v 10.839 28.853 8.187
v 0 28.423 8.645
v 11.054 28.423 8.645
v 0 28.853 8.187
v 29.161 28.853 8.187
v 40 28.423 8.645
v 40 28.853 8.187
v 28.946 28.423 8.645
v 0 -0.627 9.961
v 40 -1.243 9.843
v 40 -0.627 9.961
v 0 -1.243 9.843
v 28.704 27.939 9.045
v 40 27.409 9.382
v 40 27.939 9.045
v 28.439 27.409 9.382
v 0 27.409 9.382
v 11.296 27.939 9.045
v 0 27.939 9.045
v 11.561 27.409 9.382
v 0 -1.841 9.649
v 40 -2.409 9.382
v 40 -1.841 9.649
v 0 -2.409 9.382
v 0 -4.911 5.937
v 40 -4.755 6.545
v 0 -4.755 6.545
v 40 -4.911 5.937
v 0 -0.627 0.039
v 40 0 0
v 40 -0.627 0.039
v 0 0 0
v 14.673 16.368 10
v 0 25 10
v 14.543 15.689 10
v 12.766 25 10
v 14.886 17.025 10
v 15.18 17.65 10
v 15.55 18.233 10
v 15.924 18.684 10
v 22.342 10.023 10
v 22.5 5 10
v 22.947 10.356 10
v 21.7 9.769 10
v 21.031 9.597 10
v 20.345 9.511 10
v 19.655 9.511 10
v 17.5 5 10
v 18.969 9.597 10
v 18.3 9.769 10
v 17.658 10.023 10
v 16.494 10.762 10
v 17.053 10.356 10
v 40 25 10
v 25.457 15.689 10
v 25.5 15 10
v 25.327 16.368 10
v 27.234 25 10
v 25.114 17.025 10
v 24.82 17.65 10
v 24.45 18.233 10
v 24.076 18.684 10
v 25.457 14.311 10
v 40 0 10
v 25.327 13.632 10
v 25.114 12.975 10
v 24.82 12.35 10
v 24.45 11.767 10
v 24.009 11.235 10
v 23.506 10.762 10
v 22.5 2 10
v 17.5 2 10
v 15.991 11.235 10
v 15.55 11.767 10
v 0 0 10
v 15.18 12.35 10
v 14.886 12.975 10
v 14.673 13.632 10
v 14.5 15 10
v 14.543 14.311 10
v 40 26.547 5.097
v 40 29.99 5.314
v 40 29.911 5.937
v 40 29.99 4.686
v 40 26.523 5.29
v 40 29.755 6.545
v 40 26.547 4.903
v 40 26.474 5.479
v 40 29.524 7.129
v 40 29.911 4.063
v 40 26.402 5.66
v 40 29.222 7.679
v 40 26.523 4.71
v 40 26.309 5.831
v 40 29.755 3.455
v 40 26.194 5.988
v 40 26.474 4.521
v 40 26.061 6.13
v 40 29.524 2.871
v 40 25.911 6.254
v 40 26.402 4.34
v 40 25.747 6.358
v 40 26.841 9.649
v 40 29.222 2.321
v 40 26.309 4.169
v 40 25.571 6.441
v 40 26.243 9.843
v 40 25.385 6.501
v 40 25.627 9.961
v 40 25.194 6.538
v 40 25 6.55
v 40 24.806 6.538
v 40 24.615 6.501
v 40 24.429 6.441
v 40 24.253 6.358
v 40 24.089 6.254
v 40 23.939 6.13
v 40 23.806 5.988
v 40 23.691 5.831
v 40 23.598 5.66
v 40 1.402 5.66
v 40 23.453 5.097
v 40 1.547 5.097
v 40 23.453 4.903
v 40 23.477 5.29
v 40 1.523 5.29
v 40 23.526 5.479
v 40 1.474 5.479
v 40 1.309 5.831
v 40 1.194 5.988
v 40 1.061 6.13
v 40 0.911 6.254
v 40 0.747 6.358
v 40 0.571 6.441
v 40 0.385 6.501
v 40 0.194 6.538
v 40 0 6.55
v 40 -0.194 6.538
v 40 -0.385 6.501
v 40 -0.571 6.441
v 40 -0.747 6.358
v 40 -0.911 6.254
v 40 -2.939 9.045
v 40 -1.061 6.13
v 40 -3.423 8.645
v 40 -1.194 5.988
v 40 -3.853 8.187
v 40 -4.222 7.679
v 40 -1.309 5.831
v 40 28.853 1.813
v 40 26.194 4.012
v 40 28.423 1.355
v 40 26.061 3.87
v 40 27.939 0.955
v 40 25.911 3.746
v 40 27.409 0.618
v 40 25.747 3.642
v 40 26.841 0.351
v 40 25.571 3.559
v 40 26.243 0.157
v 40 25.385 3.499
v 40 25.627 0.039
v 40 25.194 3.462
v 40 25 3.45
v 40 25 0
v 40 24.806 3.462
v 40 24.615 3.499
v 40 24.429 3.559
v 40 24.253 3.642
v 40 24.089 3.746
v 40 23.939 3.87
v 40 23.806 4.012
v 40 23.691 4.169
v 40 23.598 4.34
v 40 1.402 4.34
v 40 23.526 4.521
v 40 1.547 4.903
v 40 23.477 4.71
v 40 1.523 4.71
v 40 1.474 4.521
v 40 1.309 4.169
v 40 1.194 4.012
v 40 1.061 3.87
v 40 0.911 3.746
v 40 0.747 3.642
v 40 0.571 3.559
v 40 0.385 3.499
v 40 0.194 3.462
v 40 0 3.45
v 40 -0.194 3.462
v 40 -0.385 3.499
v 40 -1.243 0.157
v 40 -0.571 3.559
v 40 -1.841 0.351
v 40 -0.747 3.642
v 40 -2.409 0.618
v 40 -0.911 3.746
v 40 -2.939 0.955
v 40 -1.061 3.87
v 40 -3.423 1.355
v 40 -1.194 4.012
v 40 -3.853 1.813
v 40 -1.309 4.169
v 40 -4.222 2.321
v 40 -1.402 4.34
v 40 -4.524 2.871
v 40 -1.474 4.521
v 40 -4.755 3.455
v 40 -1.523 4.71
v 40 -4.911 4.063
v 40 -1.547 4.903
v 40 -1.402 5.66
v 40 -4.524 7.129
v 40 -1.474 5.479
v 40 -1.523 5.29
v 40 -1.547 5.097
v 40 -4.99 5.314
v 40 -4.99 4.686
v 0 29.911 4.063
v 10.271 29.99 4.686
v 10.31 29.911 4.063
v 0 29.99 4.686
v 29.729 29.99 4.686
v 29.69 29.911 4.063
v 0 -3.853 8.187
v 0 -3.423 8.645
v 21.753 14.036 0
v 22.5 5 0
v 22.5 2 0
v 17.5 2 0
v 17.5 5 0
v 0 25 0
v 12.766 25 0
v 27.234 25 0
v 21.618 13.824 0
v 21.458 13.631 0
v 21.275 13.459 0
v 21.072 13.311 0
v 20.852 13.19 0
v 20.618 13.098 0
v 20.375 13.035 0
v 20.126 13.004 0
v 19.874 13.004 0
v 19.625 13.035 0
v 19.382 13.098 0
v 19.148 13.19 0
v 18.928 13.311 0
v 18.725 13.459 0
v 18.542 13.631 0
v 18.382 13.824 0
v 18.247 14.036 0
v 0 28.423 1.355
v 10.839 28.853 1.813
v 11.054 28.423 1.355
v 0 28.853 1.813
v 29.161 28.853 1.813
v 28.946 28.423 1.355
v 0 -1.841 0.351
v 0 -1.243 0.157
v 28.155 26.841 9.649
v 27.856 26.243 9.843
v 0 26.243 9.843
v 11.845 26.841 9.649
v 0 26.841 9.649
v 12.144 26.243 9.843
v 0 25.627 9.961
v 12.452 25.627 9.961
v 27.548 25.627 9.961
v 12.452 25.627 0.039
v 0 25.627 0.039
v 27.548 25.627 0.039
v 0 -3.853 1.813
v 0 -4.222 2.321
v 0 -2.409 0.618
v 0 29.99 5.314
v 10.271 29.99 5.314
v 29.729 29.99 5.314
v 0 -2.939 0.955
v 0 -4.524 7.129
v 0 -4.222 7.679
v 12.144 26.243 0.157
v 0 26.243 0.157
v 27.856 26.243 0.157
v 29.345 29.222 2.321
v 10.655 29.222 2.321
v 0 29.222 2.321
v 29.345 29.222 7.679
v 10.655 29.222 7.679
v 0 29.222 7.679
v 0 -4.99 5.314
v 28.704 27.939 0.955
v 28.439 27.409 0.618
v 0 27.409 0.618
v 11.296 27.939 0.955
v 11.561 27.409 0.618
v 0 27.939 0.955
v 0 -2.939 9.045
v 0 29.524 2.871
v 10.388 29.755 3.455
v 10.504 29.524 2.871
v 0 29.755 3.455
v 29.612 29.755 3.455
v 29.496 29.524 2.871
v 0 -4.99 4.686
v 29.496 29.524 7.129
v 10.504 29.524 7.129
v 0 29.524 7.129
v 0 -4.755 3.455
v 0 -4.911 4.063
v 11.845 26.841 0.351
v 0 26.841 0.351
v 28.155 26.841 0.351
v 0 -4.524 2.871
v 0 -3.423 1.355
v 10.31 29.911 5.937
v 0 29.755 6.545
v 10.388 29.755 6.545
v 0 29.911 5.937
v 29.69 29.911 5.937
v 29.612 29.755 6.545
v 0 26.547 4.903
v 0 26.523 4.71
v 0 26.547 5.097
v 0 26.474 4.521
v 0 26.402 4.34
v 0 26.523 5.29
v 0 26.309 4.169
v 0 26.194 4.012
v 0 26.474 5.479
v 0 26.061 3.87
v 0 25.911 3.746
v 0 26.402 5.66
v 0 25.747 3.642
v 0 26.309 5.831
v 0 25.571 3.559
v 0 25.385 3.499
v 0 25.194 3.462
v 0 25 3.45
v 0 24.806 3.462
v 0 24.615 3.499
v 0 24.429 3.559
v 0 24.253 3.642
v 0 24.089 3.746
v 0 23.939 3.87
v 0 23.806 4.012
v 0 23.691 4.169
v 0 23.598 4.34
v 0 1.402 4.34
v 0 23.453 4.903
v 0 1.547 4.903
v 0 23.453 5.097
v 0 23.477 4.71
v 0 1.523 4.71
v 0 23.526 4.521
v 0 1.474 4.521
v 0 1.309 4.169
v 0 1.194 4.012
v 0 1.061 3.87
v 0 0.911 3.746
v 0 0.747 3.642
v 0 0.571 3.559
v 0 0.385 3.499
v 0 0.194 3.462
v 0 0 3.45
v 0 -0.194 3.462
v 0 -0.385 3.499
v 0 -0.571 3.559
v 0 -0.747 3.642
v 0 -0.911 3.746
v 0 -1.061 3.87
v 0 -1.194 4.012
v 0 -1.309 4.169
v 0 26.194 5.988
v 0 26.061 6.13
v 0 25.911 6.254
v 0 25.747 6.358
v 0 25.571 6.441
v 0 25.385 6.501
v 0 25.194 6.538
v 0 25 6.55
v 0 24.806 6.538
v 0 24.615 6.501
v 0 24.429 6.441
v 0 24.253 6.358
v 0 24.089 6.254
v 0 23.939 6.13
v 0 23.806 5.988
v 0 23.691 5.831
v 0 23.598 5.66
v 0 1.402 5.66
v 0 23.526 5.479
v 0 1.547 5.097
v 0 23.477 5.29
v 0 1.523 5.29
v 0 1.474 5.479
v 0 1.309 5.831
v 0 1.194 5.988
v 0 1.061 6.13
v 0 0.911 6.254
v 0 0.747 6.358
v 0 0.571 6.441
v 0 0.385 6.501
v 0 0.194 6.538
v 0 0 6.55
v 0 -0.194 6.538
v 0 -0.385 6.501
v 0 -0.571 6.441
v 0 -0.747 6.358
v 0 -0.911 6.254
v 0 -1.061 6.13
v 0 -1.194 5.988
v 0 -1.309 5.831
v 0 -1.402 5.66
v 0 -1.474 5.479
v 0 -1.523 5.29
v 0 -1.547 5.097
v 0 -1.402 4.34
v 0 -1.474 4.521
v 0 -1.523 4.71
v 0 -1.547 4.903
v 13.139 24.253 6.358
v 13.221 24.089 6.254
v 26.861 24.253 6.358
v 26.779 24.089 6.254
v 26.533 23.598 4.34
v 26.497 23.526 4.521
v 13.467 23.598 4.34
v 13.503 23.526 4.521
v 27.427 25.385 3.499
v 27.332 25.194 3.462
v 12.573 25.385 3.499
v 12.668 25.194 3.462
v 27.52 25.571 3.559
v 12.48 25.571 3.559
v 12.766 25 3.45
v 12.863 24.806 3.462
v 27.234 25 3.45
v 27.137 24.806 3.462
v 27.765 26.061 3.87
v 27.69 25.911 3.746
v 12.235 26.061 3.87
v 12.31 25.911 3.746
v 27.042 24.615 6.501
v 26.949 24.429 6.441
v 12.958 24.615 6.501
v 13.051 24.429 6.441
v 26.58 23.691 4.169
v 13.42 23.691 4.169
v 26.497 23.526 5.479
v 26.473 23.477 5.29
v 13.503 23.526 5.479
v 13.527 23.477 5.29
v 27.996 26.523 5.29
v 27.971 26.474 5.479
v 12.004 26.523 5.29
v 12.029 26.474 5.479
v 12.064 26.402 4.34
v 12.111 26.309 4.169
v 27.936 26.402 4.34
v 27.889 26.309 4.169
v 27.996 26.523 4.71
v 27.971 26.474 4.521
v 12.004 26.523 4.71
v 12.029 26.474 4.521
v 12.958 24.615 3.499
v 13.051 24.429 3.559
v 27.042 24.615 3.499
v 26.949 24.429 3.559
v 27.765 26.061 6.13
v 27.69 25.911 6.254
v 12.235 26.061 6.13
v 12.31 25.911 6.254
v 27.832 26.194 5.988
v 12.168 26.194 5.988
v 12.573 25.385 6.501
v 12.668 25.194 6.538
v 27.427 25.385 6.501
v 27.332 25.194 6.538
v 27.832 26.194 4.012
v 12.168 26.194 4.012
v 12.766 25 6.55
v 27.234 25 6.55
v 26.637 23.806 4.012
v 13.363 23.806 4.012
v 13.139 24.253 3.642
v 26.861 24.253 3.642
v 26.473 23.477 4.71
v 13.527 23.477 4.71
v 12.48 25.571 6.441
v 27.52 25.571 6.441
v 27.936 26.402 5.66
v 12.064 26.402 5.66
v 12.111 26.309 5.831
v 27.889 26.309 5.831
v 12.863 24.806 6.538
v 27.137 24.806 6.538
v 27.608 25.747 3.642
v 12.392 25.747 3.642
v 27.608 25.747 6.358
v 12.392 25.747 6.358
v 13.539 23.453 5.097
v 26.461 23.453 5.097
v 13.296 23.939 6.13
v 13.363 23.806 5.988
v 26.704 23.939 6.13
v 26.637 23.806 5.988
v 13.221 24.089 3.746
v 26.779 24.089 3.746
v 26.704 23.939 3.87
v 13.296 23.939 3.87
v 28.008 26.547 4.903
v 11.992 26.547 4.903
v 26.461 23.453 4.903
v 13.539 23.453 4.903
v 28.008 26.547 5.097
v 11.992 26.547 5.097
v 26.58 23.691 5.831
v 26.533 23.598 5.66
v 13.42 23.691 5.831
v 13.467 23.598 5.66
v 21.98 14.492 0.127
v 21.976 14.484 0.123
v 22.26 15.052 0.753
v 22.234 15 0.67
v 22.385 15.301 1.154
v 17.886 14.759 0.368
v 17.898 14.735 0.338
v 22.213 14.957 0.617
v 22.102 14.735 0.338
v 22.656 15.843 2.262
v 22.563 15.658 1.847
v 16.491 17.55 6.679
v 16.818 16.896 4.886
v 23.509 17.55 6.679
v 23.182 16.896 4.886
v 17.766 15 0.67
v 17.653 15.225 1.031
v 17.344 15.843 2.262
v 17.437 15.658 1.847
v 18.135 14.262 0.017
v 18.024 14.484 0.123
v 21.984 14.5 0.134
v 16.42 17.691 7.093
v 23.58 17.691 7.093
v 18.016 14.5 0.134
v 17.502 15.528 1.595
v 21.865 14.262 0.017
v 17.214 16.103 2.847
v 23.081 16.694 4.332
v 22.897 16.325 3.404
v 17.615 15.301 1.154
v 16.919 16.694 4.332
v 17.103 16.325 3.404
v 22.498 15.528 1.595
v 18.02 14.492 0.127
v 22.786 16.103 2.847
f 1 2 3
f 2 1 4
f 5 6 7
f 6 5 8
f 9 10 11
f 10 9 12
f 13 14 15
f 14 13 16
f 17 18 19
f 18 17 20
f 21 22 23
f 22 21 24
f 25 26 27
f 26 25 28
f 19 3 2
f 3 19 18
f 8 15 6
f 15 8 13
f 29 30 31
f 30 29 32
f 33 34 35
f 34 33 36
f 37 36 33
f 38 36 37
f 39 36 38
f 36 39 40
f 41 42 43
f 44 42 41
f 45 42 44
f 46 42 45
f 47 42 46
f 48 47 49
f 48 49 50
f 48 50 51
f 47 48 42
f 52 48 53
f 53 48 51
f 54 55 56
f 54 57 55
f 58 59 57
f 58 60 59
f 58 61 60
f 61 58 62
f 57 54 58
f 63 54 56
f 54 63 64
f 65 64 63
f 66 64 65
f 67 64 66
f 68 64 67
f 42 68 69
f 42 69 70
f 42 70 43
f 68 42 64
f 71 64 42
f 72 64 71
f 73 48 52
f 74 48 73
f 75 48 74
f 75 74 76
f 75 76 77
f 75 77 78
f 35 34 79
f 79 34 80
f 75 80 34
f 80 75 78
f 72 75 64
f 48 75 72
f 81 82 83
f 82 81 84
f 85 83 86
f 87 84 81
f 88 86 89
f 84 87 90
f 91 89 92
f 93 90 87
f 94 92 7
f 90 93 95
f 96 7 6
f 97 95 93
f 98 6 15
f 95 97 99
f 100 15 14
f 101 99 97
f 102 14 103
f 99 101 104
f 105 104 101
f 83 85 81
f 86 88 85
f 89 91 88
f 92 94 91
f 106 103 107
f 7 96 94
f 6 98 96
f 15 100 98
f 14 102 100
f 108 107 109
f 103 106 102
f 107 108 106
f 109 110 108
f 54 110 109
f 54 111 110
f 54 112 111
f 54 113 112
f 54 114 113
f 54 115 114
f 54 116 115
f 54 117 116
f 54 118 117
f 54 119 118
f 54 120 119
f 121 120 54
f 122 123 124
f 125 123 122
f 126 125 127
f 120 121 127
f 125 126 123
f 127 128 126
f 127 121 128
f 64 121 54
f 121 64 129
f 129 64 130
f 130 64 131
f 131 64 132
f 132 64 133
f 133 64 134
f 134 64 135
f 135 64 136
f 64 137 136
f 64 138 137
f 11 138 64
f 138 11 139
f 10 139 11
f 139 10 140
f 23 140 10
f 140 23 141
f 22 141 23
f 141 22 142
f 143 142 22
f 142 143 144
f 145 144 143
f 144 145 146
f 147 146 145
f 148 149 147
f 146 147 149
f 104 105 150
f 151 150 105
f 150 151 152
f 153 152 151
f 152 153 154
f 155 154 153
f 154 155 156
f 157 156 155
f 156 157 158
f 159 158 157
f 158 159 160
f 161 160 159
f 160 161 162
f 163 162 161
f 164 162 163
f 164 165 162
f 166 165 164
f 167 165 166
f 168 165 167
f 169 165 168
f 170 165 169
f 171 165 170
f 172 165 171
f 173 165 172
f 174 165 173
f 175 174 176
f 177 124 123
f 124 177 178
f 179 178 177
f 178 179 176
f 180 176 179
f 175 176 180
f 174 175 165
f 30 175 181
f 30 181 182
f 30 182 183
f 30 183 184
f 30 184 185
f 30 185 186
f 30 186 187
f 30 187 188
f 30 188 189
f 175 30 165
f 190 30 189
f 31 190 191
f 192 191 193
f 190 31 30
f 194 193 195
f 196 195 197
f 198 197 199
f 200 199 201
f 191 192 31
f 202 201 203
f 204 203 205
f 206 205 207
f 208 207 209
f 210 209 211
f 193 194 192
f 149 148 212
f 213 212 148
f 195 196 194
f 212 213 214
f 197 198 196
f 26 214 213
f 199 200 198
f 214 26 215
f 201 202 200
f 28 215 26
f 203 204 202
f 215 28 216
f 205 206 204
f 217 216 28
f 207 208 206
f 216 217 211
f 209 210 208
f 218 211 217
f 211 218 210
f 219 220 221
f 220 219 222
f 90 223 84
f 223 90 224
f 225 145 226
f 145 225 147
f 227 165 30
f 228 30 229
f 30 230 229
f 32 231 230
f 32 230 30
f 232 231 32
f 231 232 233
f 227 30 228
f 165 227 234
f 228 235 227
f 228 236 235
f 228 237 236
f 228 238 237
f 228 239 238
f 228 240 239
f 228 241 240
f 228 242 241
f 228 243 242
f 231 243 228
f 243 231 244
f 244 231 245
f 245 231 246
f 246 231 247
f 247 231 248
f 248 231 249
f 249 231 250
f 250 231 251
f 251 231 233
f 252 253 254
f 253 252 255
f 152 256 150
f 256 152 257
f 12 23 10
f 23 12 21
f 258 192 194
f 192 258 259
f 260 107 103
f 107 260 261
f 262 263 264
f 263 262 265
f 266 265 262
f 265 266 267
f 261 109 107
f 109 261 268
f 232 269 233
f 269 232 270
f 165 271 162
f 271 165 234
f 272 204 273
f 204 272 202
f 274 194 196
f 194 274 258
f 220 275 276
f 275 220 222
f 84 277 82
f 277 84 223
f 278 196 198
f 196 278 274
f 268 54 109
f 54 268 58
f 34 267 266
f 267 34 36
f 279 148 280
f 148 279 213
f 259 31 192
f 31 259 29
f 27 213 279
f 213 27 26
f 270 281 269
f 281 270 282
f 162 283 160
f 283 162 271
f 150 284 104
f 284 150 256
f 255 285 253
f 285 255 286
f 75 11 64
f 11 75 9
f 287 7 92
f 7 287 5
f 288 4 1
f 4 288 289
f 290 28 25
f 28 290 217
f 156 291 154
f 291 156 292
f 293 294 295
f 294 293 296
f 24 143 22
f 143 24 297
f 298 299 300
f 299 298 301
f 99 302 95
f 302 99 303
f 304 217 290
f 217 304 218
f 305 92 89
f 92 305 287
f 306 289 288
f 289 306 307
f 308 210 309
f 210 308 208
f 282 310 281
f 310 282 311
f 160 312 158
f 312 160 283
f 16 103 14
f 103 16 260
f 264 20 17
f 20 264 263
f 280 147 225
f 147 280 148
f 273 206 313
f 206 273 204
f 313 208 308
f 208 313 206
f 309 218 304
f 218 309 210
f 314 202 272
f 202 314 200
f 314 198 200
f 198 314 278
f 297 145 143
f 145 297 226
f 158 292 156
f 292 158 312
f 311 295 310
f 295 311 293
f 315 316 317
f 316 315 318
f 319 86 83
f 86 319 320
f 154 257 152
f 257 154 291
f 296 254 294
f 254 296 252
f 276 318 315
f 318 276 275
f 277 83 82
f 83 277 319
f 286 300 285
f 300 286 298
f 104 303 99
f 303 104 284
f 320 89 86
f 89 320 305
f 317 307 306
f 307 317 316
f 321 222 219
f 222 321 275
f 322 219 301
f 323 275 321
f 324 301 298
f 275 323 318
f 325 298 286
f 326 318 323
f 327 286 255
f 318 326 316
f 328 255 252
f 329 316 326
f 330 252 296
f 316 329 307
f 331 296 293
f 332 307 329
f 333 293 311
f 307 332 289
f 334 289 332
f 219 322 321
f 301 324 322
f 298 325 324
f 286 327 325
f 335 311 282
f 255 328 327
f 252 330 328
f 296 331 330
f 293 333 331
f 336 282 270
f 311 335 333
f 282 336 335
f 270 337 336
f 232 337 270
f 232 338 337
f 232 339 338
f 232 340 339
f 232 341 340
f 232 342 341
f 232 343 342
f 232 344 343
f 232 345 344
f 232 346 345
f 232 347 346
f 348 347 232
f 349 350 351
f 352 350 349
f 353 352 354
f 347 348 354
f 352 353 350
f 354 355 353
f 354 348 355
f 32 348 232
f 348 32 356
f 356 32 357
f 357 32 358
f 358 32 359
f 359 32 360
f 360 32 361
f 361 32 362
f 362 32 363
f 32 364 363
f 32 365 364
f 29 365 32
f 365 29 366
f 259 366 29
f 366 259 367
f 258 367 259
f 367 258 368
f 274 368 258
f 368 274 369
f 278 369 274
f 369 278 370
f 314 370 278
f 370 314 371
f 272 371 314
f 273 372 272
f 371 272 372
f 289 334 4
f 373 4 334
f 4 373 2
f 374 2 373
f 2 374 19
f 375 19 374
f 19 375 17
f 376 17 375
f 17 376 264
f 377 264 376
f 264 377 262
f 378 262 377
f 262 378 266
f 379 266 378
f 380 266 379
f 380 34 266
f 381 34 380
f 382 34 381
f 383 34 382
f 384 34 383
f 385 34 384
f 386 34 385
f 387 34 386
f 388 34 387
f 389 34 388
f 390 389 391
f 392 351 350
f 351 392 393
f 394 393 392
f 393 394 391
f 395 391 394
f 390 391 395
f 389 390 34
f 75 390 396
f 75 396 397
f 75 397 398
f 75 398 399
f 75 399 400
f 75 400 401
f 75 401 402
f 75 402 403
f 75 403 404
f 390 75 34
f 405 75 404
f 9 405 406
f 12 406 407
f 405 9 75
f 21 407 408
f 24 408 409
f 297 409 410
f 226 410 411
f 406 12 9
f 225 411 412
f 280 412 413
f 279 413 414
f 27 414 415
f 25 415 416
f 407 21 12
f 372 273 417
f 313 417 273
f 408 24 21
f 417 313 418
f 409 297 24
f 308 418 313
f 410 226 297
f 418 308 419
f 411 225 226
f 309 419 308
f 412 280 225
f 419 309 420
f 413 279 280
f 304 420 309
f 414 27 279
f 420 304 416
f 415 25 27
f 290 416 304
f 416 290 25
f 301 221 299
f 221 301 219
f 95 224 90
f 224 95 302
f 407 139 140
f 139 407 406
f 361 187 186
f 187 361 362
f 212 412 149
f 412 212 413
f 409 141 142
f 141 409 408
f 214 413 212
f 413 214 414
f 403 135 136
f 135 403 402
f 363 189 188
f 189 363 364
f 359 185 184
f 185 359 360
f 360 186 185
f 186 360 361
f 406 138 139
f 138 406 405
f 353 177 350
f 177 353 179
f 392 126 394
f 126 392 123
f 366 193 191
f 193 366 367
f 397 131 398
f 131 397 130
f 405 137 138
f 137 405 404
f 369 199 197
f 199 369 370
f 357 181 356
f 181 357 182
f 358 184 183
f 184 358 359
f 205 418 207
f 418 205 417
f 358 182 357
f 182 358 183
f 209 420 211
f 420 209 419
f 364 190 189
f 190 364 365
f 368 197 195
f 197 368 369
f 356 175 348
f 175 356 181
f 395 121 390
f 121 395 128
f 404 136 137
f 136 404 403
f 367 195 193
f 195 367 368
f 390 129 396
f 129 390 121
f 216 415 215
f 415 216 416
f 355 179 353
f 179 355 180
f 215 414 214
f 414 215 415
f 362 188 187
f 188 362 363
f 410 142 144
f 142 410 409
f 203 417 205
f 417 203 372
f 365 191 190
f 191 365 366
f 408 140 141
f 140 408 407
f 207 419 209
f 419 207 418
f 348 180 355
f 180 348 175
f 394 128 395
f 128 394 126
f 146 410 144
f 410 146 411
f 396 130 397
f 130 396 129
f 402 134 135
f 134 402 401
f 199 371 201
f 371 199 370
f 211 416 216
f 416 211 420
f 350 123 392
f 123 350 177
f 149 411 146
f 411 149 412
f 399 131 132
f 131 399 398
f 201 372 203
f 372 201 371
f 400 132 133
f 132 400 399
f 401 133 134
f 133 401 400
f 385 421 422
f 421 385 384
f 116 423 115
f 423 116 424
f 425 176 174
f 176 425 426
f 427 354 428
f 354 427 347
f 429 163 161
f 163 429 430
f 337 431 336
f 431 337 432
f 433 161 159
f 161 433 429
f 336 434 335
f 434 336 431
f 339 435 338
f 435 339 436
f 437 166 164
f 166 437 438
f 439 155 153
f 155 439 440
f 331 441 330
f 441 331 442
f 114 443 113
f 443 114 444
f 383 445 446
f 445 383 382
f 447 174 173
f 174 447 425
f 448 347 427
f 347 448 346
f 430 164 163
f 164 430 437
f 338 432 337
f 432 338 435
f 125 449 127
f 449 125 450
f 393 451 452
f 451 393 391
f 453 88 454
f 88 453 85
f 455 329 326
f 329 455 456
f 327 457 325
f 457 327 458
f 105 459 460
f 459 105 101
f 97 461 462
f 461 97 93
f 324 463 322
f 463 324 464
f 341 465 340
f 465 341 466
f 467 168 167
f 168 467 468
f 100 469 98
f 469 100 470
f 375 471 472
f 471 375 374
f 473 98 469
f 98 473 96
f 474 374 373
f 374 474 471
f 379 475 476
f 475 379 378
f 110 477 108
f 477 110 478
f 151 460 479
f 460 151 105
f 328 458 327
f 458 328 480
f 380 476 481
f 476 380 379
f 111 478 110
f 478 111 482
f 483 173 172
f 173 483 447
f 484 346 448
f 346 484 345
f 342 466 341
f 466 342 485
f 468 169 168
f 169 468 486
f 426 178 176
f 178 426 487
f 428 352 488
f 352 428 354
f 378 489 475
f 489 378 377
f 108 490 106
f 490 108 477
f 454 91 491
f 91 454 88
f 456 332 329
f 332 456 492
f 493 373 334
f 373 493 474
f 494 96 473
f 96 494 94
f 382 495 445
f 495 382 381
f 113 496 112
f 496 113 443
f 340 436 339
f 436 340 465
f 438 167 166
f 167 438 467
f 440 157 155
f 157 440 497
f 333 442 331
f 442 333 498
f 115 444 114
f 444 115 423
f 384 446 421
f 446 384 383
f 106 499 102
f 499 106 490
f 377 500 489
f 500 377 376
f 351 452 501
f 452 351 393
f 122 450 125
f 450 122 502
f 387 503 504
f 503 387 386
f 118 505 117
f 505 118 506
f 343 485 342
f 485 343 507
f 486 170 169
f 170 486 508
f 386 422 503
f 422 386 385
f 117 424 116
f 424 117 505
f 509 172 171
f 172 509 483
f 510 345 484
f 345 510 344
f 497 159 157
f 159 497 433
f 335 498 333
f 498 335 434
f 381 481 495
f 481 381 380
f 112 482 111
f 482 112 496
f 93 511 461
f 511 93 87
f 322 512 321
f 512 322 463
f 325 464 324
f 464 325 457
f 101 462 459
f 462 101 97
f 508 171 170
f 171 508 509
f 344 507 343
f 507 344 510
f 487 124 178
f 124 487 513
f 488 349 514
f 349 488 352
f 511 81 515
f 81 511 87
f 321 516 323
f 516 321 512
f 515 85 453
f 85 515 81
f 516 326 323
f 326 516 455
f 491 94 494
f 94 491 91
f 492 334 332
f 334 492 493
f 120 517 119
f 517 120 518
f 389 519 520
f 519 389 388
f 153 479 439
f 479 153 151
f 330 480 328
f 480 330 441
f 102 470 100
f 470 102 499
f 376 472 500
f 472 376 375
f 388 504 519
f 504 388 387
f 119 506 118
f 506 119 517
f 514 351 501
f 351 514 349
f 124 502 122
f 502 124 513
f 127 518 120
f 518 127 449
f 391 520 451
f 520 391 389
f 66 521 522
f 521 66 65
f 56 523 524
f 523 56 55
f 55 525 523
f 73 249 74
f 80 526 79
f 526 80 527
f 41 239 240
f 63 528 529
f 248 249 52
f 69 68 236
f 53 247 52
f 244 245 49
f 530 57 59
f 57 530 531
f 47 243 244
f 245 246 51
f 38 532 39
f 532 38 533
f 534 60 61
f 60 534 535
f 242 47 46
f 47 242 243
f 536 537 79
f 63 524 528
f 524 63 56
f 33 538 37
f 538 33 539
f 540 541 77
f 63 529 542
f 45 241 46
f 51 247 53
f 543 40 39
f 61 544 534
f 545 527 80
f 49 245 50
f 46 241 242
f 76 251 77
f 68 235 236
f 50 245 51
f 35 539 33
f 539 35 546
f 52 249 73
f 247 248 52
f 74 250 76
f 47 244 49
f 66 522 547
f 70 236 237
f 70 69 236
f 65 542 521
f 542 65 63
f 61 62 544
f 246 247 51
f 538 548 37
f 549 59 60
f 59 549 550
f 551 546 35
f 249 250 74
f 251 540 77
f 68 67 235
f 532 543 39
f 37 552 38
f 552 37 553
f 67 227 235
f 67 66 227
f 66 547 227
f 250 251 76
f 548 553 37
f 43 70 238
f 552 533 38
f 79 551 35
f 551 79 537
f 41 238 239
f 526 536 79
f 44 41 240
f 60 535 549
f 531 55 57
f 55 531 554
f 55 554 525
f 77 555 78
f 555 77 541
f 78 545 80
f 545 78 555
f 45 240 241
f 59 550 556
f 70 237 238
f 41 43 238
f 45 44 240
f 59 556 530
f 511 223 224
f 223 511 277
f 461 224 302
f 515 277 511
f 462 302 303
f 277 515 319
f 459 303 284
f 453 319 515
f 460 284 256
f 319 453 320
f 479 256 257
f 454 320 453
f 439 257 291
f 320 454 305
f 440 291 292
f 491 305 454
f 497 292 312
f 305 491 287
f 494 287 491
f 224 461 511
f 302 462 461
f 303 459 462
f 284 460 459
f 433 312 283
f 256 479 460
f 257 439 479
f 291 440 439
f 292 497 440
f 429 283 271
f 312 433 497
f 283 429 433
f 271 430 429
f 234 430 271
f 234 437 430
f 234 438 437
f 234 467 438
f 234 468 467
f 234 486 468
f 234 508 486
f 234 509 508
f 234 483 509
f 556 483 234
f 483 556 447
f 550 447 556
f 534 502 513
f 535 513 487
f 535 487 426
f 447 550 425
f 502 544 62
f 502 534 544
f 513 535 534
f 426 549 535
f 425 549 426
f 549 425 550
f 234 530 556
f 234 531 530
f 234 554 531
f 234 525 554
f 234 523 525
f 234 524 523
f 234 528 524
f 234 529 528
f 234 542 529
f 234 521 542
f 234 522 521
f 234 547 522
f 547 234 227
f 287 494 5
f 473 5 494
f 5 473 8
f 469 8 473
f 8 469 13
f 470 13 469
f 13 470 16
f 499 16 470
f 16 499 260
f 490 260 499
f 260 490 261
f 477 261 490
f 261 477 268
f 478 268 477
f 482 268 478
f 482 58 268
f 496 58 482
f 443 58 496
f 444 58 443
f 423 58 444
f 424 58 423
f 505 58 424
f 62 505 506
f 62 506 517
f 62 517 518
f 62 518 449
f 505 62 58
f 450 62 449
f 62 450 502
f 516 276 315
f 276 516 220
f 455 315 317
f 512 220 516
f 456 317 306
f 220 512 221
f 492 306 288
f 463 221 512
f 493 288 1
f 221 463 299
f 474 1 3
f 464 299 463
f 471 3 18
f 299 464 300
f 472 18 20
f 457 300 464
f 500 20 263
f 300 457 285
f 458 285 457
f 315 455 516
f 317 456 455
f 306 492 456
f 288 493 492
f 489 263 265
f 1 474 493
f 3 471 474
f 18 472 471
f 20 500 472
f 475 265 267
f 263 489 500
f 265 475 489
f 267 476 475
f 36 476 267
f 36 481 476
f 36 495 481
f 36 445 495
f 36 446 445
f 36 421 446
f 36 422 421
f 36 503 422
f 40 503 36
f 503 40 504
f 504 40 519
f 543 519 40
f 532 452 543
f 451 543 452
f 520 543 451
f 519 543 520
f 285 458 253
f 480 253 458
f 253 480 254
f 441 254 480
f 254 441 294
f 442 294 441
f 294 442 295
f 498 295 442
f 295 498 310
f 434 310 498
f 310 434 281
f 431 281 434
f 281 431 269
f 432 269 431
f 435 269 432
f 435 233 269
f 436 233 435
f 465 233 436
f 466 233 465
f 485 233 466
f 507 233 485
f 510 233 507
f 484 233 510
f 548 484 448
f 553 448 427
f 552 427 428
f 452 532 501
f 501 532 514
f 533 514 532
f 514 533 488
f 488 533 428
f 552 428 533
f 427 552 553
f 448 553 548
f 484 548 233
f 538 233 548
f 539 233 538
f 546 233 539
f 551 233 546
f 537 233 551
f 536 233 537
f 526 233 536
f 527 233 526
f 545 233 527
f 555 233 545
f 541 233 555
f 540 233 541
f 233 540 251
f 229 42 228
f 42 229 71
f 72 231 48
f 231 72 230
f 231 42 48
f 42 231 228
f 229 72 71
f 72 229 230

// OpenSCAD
$fn=50;

//Soldering station stand
//Uncomment the different modules at the bottom of the file to export the parts

module base() 
{
    difference() 
    {
        union()
        {
            minkowski() 
            {
                cube([50,100,3]);
                cylinder(r=5,h=1);
            }
            hull() 
            {
                translate([50,95,0]) cube([5,5,4]);
                translate([50,85,0]) cube([5,10,15]);
                translate([50,60,0]) cube([5,10,4]);
            }
        }
        //mounting holes
        translate([-10,90,10]) rotate([0,90,0]) cylinder(r=3.2/2,h=70);
        // trim excess material in the middle
        translate([5,10,0]) minkowski() 
        {
            cube([35,80,3]);
            cylinder(r=5,h=1);
        }
    }
}

module sidebar() 
{
    difference() 
    {
        b=50;
        //outline
        hull () 
        {
            rotate([0,0,0]) translate([-5,-31,0]) cube([20,11,4]);
            translate([b,5,0]) cylinder(r=5,h=4);
            translate([b-12.5,17.5,0]) cylinder(r=5,h=4);
        }
        //trim away excess material
        hull () 
        {
            translate([10,-20,0]) cylinder(r=5,h=4);
            translate([40,2,0]) cylinder(r=5,h=4);
            translate([35,8,0]) cylinder(r=5,h=4);
        }
        //mounting hole
        translate([0,-25,0]) cylinder(r=3.1/2,h=70);
        translate([b,5,0]) cylinder(r=3.1/2,h=70);
        translate([b-12.5,17.5,0]) cylinder(r=3.1/2,h=70);   
    }
}

module top()
{
    difference()
    {
        //outline
        hull () 
        {
            translate([0,0,5]) rotate([0,90,0]) cylinder(r=5,h=40);
            translate([0,25,5]) rotate([0,90,0]) cylinder(r=5,h=40);
        }       
        //mounting holes
        translate([0,0,5]) rotate([0,90,0]) cylinder(r=3.1/2,h=40);
        translate([0,25,5]) rotate([0,90,0]) cylinder(r=3.1/2,h=40);
        //wedge for easier insert
        translate([20,15,0]) cylinder(r1=2,r2=11/2,h=10);        
        //the wedge-hole for the pen insert
        hull()
        {
            translate([20,15,0]) cylinder(r=2,h=10);        
            translate([30,35,0]) cylinder(r=2,h=10);        
            translate([10,35,0]) cylinder(r=2,h=10);        
        }
        //hole for supporter
        translate([17.5,2,0]) cube([5,3,10]);
    }
}

module supporter() 
{
    translate([2.5,0,0]) cylinder(r=5,h=3);
    hull() 
    {
        cube([5,65,3]);
        translate([1,65,0]) cube([3,5,2]);
    }
}

//supporter();
//base();
//sidebar();
top();
